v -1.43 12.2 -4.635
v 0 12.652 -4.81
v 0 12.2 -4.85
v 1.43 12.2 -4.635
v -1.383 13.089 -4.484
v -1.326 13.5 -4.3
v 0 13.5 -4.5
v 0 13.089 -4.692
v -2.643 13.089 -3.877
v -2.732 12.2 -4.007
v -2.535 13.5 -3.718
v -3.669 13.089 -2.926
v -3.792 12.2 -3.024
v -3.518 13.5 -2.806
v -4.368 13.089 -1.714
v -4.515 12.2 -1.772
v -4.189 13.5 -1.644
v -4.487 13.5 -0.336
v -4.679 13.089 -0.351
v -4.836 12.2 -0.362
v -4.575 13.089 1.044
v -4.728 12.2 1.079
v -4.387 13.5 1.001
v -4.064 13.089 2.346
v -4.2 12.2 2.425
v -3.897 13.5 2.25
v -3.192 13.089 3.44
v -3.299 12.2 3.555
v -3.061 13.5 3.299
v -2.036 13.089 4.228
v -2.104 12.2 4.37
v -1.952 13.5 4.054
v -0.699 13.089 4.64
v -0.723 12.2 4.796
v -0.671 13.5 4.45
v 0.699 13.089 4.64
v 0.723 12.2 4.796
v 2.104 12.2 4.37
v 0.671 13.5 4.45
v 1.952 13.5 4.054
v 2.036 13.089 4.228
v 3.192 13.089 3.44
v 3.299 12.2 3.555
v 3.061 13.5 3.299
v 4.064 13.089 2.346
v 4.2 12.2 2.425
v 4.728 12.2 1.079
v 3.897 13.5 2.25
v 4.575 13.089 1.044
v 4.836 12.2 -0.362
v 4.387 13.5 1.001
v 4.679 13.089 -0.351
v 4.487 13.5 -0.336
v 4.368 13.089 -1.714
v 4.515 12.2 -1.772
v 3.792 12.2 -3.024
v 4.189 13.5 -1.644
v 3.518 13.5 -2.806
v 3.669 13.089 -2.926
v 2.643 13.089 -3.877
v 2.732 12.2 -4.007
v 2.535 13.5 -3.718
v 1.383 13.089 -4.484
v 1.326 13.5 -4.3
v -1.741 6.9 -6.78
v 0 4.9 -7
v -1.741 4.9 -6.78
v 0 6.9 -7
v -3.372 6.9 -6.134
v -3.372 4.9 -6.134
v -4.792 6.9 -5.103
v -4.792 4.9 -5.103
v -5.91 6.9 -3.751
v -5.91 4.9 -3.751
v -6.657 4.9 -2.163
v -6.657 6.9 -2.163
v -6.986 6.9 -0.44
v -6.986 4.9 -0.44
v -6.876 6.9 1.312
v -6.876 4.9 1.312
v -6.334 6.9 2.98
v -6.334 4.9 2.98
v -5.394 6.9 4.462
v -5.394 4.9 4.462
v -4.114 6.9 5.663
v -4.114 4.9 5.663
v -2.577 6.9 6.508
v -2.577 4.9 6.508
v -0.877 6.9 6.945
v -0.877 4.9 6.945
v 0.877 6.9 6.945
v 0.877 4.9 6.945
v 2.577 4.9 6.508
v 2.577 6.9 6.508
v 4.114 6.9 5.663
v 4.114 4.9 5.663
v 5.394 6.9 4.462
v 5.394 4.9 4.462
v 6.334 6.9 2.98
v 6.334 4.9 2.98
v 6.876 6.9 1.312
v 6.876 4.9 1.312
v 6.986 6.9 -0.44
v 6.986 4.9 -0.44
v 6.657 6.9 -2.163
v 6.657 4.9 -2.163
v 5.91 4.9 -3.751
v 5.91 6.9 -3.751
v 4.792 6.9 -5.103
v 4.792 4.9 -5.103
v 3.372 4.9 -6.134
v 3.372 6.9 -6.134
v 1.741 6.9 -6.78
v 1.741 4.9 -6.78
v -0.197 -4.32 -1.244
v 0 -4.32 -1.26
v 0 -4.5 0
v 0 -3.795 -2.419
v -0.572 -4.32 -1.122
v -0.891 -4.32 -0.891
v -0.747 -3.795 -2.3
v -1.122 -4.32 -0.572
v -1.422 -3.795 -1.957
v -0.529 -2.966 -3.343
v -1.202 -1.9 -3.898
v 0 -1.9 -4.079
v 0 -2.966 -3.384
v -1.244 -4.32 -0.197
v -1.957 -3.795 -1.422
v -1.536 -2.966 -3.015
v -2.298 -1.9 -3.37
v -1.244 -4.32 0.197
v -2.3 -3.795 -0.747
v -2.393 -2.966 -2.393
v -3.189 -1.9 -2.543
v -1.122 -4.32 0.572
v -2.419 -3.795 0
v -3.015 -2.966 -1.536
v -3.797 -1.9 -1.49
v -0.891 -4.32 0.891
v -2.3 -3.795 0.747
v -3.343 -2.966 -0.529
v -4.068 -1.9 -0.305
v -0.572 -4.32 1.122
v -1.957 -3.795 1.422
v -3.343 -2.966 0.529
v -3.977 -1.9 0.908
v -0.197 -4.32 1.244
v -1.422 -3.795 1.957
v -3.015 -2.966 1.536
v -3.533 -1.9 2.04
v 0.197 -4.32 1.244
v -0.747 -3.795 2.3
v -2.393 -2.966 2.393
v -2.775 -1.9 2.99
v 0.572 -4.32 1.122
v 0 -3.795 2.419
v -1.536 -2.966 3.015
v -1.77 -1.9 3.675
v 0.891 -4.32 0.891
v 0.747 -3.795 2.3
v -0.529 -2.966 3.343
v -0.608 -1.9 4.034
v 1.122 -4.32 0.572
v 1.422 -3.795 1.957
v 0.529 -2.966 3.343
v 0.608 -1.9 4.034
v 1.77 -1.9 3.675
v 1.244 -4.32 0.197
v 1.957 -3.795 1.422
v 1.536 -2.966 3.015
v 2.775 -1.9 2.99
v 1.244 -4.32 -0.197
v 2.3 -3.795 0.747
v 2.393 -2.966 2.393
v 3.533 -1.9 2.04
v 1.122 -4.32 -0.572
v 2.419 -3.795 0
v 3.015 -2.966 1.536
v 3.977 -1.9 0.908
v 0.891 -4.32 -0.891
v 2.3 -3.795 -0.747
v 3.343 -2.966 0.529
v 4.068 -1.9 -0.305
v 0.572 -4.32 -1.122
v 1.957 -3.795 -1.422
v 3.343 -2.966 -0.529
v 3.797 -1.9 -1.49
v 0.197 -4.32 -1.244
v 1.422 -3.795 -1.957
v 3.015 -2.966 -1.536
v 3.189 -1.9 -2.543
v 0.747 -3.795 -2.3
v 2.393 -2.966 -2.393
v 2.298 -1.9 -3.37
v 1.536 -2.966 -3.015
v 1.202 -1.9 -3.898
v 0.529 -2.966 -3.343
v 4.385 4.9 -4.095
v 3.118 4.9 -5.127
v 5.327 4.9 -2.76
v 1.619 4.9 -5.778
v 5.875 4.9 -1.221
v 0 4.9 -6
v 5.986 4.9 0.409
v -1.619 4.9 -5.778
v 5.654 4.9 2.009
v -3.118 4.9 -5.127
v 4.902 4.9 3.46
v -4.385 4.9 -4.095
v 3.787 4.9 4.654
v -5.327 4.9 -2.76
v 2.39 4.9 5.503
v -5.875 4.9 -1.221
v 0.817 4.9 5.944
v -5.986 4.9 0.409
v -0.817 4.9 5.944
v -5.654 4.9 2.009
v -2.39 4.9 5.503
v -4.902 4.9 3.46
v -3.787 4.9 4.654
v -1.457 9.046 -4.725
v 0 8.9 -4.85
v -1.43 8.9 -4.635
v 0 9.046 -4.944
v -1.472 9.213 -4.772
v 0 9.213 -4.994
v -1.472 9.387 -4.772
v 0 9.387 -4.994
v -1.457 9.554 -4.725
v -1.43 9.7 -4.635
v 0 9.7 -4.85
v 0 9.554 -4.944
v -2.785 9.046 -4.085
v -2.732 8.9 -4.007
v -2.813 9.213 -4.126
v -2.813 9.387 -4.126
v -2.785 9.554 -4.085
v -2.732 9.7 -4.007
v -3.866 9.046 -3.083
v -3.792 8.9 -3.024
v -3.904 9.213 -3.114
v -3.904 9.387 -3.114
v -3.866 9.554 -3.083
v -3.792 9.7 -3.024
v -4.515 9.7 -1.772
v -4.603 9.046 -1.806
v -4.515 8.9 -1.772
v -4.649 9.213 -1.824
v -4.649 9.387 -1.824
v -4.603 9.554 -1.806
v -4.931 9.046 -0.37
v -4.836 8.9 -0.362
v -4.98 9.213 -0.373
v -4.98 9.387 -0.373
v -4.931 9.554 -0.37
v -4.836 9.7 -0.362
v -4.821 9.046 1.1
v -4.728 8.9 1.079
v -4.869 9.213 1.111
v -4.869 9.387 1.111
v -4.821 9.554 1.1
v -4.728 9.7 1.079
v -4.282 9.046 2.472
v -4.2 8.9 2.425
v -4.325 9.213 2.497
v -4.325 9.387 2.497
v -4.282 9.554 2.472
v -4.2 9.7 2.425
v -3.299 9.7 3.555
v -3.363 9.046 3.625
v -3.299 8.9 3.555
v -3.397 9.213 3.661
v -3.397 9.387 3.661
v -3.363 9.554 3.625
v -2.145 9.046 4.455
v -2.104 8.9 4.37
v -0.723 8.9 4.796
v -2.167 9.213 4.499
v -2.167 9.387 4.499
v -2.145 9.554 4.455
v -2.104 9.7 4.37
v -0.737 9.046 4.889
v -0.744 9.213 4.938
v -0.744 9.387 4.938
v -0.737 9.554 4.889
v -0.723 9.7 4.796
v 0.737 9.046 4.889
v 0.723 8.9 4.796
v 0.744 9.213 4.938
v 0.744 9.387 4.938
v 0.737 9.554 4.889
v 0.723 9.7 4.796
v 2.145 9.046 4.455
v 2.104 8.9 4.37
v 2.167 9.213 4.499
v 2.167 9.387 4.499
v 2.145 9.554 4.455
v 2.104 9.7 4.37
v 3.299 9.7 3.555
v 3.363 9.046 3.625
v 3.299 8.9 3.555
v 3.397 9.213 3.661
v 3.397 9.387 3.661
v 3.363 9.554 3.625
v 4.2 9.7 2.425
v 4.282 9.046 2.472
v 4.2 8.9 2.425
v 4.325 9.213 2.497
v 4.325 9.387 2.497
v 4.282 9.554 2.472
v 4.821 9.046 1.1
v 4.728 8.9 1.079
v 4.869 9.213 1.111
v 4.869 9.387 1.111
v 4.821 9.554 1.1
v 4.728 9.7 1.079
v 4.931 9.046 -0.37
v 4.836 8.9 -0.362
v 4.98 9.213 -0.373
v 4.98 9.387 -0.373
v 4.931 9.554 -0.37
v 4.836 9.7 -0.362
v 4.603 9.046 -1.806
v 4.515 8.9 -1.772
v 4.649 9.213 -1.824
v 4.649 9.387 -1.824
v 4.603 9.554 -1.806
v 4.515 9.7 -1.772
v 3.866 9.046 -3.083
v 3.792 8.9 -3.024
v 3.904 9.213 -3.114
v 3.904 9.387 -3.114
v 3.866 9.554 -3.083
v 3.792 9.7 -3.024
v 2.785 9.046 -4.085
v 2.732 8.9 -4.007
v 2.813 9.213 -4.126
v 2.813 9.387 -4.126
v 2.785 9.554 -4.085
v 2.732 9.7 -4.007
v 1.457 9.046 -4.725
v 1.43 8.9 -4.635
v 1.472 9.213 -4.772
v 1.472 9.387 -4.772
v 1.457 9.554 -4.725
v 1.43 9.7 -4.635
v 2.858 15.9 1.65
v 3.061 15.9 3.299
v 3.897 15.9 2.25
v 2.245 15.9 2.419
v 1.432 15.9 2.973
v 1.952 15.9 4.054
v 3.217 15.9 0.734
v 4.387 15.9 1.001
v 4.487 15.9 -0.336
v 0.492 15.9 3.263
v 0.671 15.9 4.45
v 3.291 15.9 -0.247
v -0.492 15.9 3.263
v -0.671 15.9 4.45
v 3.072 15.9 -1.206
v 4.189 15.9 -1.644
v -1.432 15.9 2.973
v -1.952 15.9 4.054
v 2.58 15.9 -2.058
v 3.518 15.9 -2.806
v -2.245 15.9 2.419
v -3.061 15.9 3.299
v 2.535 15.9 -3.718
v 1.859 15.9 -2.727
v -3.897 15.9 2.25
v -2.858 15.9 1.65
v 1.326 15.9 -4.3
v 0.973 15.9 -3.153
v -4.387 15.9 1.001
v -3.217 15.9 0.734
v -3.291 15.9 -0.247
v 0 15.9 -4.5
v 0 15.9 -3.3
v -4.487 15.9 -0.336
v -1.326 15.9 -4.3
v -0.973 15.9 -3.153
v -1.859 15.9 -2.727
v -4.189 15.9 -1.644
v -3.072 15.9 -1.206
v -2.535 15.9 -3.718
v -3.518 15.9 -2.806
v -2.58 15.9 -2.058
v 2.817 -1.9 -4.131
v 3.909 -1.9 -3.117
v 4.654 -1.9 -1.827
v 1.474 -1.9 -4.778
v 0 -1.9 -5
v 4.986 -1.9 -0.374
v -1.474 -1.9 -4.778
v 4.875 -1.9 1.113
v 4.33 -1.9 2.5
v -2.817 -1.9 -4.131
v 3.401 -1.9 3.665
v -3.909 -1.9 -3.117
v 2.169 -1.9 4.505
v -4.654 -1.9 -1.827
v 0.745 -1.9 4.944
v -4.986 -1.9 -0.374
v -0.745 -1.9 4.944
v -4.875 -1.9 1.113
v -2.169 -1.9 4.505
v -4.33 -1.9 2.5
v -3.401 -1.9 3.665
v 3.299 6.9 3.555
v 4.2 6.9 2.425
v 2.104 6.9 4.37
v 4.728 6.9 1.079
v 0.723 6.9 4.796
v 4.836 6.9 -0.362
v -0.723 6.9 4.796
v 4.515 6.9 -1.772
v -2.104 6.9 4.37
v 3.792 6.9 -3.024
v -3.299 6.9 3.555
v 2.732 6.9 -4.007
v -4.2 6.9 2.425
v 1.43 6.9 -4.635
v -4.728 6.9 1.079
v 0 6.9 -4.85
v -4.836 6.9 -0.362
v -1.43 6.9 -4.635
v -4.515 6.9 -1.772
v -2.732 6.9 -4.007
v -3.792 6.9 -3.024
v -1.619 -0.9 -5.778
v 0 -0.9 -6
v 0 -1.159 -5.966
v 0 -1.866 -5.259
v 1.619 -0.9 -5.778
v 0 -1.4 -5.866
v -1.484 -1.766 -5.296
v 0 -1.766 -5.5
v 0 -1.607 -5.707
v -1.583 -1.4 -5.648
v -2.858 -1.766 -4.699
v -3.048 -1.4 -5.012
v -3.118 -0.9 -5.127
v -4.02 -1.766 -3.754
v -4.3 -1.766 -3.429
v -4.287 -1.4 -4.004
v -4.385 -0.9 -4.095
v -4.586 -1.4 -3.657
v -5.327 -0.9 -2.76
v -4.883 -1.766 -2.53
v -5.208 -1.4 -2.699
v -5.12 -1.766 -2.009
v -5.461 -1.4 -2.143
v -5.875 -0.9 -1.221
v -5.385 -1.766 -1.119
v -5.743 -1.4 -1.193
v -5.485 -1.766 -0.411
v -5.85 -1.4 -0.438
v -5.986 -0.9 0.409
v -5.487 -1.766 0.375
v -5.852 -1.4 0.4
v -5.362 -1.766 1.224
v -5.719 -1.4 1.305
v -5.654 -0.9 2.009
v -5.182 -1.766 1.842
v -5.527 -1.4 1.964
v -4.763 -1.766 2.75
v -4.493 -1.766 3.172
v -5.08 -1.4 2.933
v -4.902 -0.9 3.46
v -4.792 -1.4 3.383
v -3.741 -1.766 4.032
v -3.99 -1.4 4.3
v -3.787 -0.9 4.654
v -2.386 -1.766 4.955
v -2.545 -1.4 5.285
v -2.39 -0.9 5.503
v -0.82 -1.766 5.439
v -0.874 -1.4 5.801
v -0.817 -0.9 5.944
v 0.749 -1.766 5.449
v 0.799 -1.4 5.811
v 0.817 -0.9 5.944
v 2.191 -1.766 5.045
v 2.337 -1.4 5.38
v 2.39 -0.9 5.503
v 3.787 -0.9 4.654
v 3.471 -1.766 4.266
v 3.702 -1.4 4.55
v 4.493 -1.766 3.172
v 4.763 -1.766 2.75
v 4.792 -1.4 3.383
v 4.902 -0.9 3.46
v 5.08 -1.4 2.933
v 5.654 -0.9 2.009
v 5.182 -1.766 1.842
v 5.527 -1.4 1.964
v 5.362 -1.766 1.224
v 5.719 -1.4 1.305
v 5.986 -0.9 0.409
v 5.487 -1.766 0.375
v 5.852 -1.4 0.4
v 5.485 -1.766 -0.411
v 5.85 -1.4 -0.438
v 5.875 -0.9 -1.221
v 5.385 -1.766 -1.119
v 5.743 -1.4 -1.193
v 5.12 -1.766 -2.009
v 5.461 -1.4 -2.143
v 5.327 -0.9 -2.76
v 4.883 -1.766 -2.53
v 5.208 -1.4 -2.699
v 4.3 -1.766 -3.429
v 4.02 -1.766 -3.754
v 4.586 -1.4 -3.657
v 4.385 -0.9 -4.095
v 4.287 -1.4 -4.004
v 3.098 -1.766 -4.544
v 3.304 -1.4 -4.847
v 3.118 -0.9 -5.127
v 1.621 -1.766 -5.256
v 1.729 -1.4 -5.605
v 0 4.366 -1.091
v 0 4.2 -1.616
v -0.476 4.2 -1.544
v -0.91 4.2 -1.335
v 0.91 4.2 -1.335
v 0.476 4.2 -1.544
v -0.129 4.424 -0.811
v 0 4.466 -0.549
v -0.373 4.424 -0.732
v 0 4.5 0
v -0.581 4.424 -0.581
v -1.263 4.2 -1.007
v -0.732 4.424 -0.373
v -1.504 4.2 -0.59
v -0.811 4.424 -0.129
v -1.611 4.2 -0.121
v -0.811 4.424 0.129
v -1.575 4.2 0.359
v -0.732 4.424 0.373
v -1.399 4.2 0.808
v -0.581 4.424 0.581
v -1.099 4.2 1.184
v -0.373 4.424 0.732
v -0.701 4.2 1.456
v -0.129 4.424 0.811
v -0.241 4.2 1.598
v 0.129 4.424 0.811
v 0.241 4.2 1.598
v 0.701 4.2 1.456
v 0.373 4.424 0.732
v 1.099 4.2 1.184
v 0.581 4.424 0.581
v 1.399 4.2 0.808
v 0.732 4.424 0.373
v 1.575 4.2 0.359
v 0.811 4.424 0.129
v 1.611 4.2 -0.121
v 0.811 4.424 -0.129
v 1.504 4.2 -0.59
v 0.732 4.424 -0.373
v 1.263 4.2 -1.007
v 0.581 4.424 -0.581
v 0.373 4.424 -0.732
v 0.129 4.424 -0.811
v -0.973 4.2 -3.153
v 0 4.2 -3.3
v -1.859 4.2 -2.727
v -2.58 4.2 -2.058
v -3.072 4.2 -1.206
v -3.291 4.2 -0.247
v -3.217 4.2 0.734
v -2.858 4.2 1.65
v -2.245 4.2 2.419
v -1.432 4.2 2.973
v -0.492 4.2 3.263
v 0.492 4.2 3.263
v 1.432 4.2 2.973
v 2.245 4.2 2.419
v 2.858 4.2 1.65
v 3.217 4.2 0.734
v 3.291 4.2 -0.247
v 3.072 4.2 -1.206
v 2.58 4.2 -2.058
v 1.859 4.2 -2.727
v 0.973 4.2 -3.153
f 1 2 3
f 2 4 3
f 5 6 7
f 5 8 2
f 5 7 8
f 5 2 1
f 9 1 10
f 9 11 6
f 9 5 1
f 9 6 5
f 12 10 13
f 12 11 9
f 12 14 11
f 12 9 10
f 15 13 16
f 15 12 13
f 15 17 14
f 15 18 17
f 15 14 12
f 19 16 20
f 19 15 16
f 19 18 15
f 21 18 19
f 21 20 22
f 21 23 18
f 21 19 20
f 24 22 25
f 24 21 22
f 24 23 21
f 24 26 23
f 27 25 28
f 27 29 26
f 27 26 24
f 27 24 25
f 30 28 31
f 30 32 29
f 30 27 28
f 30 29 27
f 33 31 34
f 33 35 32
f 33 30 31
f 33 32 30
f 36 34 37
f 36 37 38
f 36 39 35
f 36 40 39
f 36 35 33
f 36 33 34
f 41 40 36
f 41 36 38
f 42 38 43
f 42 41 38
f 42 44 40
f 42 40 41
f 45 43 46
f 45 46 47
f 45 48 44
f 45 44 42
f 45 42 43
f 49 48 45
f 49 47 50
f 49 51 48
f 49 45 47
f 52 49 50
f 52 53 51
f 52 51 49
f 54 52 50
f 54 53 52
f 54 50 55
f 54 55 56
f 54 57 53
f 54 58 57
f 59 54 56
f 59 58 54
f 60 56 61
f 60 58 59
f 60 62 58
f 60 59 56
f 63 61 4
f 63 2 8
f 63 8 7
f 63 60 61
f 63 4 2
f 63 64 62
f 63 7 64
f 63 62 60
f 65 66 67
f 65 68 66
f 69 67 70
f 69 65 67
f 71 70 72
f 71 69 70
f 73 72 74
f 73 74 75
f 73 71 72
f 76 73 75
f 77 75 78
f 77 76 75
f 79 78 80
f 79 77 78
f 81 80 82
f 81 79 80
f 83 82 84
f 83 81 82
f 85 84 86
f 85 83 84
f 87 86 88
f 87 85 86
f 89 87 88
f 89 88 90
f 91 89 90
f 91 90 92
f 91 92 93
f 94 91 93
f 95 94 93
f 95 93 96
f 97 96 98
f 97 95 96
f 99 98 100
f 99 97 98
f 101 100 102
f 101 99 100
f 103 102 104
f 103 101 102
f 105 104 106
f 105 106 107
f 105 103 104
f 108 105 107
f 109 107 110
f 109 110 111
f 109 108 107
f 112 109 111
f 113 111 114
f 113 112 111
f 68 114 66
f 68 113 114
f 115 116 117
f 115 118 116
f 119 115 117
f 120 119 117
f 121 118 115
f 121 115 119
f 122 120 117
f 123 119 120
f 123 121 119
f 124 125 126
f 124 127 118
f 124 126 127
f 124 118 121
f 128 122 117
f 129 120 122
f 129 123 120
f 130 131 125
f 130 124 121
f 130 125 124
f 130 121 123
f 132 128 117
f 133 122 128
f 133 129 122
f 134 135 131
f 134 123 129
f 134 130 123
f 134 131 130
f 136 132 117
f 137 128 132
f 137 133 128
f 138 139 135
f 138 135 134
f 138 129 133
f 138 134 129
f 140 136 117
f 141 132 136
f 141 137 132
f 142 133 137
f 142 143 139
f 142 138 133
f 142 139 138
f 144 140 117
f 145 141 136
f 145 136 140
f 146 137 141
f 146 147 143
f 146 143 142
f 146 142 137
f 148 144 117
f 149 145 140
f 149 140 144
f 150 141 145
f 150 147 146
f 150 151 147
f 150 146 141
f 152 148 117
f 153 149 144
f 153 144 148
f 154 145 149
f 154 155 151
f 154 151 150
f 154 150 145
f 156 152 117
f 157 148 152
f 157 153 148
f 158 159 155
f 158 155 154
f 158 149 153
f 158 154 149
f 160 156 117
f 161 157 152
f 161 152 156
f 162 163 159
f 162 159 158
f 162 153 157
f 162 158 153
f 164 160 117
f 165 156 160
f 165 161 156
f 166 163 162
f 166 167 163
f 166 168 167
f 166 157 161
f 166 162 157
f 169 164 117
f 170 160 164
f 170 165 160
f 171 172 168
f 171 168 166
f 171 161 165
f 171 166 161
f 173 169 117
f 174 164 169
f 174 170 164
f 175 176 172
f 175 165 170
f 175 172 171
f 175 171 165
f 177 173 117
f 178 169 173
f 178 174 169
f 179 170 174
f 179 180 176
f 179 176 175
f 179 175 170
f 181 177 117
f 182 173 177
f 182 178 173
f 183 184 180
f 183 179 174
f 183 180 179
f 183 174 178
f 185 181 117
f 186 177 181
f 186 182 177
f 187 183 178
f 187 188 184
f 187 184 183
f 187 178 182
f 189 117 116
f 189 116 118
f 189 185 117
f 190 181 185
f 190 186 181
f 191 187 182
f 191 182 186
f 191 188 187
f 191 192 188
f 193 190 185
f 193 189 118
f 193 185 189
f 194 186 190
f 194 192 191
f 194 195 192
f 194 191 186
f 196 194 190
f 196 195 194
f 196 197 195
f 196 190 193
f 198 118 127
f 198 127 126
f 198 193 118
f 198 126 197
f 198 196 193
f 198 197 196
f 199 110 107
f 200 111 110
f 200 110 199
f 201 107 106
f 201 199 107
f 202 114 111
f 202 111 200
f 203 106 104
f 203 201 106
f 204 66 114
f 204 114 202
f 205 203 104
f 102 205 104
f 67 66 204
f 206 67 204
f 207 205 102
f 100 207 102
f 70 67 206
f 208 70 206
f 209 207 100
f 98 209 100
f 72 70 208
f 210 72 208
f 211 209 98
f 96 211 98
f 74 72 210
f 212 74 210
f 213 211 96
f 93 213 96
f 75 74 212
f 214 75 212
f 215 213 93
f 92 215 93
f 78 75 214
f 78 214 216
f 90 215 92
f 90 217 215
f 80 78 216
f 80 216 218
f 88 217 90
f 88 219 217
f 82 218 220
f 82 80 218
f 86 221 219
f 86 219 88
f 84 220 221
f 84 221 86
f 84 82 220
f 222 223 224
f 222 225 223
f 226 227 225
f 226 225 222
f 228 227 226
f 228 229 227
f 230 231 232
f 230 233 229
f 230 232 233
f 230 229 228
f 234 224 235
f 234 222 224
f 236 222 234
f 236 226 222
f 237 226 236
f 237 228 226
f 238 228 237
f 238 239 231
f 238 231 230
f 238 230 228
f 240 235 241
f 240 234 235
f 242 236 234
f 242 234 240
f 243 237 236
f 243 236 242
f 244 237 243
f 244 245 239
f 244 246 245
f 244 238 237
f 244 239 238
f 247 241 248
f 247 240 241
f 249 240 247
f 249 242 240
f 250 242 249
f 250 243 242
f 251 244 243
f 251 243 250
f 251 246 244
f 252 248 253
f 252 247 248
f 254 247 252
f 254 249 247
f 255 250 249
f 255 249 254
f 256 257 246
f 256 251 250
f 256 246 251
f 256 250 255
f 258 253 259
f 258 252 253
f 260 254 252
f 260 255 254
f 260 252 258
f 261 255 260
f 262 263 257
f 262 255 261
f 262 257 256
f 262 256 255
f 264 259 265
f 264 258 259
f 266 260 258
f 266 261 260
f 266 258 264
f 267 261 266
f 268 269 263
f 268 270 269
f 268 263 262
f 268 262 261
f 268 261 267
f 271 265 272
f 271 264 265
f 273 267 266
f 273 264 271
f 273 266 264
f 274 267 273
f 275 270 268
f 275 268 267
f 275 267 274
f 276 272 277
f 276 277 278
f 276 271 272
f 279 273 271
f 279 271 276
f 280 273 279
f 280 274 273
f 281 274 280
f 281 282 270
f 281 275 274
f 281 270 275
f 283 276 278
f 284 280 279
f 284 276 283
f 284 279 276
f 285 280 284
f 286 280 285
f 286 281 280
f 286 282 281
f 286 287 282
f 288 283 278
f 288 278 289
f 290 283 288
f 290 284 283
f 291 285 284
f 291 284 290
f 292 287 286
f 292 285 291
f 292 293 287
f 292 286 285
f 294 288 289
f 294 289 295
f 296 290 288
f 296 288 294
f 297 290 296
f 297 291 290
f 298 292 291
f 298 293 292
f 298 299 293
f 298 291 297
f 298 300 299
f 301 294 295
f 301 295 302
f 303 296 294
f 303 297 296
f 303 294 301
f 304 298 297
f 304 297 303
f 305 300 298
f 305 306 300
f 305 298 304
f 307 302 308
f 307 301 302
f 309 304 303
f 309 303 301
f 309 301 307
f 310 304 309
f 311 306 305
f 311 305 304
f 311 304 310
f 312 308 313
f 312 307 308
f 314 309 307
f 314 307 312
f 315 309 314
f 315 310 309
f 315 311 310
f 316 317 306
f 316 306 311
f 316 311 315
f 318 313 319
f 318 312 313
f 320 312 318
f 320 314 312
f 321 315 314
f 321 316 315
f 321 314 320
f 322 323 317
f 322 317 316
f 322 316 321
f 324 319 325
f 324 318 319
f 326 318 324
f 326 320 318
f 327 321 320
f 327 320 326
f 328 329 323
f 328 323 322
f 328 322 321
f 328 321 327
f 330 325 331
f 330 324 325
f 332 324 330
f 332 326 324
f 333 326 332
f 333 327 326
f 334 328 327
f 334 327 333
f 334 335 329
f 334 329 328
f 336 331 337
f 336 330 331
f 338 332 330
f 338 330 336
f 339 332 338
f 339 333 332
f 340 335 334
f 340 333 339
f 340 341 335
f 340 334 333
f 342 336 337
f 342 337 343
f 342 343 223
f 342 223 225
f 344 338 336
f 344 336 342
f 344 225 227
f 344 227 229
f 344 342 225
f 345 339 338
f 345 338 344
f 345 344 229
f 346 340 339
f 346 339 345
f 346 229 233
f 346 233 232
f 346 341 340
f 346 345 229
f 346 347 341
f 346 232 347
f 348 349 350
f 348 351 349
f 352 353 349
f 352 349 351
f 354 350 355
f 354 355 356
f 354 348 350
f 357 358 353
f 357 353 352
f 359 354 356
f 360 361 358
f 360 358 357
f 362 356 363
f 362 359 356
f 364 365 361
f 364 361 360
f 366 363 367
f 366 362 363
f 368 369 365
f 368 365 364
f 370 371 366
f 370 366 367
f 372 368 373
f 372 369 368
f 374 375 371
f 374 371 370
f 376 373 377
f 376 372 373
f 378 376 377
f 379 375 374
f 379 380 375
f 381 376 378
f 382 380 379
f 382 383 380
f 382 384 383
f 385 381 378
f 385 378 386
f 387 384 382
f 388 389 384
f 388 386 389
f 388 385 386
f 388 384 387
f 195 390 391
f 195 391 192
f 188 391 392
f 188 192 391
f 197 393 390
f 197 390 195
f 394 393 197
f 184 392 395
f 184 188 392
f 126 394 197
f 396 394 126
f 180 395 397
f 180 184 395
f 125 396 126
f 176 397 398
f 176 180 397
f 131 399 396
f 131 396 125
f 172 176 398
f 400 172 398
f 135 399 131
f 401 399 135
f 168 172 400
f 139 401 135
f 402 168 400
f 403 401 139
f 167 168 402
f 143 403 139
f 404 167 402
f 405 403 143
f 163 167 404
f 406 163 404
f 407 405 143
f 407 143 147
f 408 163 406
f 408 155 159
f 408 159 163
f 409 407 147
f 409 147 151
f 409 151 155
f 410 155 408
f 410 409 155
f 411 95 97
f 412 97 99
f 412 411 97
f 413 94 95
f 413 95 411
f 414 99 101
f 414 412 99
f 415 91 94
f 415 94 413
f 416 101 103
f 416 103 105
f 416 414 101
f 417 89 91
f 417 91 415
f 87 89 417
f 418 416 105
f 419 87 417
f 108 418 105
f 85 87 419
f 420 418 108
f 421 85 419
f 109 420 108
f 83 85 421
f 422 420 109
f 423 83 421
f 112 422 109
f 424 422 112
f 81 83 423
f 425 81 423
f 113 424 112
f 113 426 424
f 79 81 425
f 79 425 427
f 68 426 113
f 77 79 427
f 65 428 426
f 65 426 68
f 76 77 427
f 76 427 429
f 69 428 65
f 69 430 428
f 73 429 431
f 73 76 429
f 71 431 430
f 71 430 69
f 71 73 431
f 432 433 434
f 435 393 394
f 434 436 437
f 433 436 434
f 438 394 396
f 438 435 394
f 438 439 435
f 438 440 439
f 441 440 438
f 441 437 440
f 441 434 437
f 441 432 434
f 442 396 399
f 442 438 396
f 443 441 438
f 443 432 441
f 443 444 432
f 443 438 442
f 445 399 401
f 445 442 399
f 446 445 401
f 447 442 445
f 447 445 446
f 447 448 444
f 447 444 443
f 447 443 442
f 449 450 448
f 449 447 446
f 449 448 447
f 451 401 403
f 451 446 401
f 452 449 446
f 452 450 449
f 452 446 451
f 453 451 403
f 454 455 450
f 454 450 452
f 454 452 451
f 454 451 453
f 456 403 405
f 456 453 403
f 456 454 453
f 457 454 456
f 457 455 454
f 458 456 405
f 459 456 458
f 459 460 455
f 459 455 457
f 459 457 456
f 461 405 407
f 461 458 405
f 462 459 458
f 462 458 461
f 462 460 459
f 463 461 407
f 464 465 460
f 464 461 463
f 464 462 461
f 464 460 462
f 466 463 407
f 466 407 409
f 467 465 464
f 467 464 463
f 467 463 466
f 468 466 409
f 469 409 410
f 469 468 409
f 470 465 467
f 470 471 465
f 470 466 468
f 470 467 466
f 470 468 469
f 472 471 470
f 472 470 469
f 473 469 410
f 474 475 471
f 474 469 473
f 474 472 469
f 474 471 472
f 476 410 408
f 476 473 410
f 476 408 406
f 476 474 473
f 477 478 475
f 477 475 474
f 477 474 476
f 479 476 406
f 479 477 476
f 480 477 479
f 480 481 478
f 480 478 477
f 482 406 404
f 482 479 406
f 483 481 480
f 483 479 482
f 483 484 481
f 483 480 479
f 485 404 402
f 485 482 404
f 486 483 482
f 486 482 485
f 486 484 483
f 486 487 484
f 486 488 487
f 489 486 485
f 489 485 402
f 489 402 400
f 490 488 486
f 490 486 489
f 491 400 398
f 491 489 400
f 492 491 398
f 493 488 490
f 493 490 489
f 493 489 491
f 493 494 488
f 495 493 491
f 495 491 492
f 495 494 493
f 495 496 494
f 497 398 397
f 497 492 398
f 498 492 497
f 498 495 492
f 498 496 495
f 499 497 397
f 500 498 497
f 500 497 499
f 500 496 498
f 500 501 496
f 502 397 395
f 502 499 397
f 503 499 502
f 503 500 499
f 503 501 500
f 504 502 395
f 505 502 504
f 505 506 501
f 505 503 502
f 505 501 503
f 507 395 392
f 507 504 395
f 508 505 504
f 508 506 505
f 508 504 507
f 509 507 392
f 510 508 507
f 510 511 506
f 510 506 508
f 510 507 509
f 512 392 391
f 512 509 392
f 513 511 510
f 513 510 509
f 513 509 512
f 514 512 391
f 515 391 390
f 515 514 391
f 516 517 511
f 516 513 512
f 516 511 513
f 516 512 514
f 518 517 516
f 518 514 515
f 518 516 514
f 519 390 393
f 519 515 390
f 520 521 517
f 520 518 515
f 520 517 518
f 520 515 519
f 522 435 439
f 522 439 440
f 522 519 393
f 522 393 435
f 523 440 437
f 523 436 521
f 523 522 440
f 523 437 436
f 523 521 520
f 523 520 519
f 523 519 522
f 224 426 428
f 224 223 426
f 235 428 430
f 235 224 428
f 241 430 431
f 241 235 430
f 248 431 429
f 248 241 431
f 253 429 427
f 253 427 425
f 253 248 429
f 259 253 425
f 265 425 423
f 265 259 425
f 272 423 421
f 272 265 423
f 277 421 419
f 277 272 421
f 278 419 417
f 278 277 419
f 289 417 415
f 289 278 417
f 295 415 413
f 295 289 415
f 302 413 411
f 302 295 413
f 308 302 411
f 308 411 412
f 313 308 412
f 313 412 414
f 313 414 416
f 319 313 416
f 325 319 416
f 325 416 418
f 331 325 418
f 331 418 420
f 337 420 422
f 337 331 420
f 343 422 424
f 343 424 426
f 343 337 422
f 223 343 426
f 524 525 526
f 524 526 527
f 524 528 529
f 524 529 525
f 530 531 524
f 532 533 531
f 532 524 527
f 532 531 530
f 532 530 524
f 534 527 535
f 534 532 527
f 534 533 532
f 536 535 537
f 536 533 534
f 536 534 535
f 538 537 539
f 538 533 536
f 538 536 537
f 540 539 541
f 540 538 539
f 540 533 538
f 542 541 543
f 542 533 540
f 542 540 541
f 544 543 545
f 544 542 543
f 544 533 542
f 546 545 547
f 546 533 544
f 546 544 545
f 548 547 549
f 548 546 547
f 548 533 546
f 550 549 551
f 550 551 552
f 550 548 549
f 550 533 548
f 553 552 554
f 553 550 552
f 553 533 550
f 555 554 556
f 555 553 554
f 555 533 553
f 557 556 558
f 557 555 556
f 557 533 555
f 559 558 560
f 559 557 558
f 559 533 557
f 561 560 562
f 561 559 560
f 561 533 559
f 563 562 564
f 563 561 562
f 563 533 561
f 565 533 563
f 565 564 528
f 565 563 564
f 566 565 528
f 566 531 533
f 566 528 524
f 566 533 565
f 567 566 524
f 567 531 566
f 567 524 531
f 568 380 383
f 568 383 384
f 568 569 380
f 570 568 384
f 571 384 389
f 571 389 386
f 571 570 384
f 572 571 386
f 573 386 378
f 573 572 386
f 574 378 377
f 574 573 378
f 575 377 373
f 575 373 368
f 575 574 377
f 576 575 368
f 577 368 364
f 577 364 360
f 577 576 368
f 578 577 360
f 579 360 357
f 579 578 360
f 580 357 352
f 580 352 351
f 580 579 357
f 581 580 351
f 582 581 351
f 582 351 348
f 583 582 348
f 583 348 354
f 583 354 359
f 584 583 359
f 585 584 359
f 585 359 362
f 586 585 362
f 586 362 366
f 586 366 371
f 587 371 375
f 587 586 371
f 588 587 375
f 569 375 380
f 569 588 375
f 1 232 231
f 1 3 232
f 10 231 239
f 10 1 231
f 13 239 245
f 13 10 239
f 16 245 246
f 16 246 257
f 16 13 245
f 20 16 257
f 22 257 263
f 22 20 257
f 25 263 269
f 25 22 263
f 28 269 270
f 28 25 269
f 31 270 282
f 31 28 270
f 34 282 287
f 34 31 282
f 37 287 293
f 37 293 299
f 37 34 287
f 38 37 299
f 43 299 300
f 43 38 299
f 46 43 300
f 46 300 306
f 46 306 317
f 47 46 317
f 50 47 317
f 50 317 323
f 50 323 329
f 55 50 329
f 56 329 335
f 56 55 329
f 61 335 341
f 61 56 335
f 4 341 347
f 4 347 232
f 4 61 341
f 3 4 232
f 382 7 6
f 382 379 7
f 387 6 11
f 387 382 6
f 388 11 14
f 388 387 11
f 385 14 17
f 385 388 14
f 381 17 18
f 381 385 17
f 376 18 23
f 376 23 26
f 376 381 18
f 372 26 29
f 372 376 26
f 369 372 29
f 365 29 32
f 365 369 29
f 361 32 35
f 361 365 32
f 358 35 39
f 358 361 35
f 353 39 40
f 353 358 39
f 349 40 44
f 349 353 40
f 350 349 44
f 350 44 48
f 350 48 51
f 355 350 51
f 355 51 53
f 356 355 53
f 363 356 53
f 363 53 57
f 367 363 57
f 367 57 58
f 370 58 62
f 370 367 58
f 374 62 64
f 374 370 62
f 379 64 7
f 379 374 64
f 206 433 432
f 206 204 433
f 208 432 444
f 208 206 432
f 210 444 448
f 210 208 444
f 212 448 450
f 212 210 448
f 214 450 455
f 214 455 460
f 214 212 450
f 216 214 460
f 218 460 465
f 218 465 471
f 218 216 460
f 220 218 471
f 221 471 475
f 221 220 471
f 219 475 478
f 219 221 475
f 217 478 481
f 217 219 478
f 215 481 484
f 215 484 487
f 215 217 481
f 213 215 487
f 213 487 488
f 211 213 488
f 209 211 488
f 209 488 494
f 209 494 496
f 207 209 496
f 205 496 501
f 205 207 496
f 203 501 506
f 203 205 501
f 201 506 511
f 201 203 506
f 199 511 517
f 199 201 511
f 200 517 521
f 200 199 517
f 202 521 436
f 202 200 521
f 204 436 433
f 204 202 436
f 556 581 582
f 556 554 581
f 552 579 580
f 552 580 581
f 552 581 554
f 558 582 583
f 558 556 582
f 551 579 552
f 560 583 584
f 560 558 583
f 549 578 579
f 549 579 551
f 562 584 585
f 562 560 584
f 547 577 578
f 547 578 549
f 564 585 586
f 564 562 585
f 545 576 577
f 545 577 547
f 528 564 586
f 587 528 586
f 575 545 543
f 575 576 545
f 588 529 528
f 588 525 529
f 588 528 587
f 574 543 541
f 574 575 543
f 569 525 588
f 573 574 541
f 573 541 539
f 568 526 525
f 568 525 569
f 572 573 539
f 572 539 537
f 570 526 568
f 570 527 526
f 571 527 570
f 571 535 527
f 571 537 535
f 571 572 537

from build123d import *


with BuildPart() as part:
    # Sketch1 → Revolve1 (revolve)
    with BuildSketch(Plane.XY, mode=Mode.PRIVATE) as revolve1_sk:
        with BuildLine():
            Line((4.079215611, -1.9), (5, -1.9))
            ThreePointArc((5, -1.9), (5.707106781, -1.607106781), (6, -0.9))
            Line((6, -0.9), (6, 4.9))
            Line((6, 4.9), (7, 4.9))
            Line((7, 4.9), (7, 6.9))
            Line((7, 6.9), (4.85, 6.9))
            Line((4.85, 6.9), (4.85, 8.9))
            ThreePointArc((4.85, 8.9), (5, 9.3), (4.85, 9.7))
            Line((4.85, 9.7), (4.85, 12.2))
            ThreePointArc((4.85, 12.2), (4.760969375, 12.873145601), (4.5, 13.5))
            Line((4.5, 13.5), (4.5, 15.9))
            Line((4.5, 15.9), (3.3, 15.9))
            Line((3.3, 15.9), (3.3, 4.2))
            Line((3.3, 4.2), (1.615549442, 4.2))
            ThreePointArc((1.615549442, 4.2), (0.821583836, 4.424364361), (0, 4.5))
            Line((0, 4.5), (0, 4.2))
            Line((0, 4.2), (0, -4.5))
            ThreePointArc((0, -4.5), (2.418677324, -3.794733192), (4.079215611, -1.9))
        make_face()
    revolve(revolve1_sk.sketch.rotate(Axis((0, 0, 0), (0, 1, 0)), 90), axis=Axis((0, 0, 0), (0, 1, 0)))


solid = part.part
